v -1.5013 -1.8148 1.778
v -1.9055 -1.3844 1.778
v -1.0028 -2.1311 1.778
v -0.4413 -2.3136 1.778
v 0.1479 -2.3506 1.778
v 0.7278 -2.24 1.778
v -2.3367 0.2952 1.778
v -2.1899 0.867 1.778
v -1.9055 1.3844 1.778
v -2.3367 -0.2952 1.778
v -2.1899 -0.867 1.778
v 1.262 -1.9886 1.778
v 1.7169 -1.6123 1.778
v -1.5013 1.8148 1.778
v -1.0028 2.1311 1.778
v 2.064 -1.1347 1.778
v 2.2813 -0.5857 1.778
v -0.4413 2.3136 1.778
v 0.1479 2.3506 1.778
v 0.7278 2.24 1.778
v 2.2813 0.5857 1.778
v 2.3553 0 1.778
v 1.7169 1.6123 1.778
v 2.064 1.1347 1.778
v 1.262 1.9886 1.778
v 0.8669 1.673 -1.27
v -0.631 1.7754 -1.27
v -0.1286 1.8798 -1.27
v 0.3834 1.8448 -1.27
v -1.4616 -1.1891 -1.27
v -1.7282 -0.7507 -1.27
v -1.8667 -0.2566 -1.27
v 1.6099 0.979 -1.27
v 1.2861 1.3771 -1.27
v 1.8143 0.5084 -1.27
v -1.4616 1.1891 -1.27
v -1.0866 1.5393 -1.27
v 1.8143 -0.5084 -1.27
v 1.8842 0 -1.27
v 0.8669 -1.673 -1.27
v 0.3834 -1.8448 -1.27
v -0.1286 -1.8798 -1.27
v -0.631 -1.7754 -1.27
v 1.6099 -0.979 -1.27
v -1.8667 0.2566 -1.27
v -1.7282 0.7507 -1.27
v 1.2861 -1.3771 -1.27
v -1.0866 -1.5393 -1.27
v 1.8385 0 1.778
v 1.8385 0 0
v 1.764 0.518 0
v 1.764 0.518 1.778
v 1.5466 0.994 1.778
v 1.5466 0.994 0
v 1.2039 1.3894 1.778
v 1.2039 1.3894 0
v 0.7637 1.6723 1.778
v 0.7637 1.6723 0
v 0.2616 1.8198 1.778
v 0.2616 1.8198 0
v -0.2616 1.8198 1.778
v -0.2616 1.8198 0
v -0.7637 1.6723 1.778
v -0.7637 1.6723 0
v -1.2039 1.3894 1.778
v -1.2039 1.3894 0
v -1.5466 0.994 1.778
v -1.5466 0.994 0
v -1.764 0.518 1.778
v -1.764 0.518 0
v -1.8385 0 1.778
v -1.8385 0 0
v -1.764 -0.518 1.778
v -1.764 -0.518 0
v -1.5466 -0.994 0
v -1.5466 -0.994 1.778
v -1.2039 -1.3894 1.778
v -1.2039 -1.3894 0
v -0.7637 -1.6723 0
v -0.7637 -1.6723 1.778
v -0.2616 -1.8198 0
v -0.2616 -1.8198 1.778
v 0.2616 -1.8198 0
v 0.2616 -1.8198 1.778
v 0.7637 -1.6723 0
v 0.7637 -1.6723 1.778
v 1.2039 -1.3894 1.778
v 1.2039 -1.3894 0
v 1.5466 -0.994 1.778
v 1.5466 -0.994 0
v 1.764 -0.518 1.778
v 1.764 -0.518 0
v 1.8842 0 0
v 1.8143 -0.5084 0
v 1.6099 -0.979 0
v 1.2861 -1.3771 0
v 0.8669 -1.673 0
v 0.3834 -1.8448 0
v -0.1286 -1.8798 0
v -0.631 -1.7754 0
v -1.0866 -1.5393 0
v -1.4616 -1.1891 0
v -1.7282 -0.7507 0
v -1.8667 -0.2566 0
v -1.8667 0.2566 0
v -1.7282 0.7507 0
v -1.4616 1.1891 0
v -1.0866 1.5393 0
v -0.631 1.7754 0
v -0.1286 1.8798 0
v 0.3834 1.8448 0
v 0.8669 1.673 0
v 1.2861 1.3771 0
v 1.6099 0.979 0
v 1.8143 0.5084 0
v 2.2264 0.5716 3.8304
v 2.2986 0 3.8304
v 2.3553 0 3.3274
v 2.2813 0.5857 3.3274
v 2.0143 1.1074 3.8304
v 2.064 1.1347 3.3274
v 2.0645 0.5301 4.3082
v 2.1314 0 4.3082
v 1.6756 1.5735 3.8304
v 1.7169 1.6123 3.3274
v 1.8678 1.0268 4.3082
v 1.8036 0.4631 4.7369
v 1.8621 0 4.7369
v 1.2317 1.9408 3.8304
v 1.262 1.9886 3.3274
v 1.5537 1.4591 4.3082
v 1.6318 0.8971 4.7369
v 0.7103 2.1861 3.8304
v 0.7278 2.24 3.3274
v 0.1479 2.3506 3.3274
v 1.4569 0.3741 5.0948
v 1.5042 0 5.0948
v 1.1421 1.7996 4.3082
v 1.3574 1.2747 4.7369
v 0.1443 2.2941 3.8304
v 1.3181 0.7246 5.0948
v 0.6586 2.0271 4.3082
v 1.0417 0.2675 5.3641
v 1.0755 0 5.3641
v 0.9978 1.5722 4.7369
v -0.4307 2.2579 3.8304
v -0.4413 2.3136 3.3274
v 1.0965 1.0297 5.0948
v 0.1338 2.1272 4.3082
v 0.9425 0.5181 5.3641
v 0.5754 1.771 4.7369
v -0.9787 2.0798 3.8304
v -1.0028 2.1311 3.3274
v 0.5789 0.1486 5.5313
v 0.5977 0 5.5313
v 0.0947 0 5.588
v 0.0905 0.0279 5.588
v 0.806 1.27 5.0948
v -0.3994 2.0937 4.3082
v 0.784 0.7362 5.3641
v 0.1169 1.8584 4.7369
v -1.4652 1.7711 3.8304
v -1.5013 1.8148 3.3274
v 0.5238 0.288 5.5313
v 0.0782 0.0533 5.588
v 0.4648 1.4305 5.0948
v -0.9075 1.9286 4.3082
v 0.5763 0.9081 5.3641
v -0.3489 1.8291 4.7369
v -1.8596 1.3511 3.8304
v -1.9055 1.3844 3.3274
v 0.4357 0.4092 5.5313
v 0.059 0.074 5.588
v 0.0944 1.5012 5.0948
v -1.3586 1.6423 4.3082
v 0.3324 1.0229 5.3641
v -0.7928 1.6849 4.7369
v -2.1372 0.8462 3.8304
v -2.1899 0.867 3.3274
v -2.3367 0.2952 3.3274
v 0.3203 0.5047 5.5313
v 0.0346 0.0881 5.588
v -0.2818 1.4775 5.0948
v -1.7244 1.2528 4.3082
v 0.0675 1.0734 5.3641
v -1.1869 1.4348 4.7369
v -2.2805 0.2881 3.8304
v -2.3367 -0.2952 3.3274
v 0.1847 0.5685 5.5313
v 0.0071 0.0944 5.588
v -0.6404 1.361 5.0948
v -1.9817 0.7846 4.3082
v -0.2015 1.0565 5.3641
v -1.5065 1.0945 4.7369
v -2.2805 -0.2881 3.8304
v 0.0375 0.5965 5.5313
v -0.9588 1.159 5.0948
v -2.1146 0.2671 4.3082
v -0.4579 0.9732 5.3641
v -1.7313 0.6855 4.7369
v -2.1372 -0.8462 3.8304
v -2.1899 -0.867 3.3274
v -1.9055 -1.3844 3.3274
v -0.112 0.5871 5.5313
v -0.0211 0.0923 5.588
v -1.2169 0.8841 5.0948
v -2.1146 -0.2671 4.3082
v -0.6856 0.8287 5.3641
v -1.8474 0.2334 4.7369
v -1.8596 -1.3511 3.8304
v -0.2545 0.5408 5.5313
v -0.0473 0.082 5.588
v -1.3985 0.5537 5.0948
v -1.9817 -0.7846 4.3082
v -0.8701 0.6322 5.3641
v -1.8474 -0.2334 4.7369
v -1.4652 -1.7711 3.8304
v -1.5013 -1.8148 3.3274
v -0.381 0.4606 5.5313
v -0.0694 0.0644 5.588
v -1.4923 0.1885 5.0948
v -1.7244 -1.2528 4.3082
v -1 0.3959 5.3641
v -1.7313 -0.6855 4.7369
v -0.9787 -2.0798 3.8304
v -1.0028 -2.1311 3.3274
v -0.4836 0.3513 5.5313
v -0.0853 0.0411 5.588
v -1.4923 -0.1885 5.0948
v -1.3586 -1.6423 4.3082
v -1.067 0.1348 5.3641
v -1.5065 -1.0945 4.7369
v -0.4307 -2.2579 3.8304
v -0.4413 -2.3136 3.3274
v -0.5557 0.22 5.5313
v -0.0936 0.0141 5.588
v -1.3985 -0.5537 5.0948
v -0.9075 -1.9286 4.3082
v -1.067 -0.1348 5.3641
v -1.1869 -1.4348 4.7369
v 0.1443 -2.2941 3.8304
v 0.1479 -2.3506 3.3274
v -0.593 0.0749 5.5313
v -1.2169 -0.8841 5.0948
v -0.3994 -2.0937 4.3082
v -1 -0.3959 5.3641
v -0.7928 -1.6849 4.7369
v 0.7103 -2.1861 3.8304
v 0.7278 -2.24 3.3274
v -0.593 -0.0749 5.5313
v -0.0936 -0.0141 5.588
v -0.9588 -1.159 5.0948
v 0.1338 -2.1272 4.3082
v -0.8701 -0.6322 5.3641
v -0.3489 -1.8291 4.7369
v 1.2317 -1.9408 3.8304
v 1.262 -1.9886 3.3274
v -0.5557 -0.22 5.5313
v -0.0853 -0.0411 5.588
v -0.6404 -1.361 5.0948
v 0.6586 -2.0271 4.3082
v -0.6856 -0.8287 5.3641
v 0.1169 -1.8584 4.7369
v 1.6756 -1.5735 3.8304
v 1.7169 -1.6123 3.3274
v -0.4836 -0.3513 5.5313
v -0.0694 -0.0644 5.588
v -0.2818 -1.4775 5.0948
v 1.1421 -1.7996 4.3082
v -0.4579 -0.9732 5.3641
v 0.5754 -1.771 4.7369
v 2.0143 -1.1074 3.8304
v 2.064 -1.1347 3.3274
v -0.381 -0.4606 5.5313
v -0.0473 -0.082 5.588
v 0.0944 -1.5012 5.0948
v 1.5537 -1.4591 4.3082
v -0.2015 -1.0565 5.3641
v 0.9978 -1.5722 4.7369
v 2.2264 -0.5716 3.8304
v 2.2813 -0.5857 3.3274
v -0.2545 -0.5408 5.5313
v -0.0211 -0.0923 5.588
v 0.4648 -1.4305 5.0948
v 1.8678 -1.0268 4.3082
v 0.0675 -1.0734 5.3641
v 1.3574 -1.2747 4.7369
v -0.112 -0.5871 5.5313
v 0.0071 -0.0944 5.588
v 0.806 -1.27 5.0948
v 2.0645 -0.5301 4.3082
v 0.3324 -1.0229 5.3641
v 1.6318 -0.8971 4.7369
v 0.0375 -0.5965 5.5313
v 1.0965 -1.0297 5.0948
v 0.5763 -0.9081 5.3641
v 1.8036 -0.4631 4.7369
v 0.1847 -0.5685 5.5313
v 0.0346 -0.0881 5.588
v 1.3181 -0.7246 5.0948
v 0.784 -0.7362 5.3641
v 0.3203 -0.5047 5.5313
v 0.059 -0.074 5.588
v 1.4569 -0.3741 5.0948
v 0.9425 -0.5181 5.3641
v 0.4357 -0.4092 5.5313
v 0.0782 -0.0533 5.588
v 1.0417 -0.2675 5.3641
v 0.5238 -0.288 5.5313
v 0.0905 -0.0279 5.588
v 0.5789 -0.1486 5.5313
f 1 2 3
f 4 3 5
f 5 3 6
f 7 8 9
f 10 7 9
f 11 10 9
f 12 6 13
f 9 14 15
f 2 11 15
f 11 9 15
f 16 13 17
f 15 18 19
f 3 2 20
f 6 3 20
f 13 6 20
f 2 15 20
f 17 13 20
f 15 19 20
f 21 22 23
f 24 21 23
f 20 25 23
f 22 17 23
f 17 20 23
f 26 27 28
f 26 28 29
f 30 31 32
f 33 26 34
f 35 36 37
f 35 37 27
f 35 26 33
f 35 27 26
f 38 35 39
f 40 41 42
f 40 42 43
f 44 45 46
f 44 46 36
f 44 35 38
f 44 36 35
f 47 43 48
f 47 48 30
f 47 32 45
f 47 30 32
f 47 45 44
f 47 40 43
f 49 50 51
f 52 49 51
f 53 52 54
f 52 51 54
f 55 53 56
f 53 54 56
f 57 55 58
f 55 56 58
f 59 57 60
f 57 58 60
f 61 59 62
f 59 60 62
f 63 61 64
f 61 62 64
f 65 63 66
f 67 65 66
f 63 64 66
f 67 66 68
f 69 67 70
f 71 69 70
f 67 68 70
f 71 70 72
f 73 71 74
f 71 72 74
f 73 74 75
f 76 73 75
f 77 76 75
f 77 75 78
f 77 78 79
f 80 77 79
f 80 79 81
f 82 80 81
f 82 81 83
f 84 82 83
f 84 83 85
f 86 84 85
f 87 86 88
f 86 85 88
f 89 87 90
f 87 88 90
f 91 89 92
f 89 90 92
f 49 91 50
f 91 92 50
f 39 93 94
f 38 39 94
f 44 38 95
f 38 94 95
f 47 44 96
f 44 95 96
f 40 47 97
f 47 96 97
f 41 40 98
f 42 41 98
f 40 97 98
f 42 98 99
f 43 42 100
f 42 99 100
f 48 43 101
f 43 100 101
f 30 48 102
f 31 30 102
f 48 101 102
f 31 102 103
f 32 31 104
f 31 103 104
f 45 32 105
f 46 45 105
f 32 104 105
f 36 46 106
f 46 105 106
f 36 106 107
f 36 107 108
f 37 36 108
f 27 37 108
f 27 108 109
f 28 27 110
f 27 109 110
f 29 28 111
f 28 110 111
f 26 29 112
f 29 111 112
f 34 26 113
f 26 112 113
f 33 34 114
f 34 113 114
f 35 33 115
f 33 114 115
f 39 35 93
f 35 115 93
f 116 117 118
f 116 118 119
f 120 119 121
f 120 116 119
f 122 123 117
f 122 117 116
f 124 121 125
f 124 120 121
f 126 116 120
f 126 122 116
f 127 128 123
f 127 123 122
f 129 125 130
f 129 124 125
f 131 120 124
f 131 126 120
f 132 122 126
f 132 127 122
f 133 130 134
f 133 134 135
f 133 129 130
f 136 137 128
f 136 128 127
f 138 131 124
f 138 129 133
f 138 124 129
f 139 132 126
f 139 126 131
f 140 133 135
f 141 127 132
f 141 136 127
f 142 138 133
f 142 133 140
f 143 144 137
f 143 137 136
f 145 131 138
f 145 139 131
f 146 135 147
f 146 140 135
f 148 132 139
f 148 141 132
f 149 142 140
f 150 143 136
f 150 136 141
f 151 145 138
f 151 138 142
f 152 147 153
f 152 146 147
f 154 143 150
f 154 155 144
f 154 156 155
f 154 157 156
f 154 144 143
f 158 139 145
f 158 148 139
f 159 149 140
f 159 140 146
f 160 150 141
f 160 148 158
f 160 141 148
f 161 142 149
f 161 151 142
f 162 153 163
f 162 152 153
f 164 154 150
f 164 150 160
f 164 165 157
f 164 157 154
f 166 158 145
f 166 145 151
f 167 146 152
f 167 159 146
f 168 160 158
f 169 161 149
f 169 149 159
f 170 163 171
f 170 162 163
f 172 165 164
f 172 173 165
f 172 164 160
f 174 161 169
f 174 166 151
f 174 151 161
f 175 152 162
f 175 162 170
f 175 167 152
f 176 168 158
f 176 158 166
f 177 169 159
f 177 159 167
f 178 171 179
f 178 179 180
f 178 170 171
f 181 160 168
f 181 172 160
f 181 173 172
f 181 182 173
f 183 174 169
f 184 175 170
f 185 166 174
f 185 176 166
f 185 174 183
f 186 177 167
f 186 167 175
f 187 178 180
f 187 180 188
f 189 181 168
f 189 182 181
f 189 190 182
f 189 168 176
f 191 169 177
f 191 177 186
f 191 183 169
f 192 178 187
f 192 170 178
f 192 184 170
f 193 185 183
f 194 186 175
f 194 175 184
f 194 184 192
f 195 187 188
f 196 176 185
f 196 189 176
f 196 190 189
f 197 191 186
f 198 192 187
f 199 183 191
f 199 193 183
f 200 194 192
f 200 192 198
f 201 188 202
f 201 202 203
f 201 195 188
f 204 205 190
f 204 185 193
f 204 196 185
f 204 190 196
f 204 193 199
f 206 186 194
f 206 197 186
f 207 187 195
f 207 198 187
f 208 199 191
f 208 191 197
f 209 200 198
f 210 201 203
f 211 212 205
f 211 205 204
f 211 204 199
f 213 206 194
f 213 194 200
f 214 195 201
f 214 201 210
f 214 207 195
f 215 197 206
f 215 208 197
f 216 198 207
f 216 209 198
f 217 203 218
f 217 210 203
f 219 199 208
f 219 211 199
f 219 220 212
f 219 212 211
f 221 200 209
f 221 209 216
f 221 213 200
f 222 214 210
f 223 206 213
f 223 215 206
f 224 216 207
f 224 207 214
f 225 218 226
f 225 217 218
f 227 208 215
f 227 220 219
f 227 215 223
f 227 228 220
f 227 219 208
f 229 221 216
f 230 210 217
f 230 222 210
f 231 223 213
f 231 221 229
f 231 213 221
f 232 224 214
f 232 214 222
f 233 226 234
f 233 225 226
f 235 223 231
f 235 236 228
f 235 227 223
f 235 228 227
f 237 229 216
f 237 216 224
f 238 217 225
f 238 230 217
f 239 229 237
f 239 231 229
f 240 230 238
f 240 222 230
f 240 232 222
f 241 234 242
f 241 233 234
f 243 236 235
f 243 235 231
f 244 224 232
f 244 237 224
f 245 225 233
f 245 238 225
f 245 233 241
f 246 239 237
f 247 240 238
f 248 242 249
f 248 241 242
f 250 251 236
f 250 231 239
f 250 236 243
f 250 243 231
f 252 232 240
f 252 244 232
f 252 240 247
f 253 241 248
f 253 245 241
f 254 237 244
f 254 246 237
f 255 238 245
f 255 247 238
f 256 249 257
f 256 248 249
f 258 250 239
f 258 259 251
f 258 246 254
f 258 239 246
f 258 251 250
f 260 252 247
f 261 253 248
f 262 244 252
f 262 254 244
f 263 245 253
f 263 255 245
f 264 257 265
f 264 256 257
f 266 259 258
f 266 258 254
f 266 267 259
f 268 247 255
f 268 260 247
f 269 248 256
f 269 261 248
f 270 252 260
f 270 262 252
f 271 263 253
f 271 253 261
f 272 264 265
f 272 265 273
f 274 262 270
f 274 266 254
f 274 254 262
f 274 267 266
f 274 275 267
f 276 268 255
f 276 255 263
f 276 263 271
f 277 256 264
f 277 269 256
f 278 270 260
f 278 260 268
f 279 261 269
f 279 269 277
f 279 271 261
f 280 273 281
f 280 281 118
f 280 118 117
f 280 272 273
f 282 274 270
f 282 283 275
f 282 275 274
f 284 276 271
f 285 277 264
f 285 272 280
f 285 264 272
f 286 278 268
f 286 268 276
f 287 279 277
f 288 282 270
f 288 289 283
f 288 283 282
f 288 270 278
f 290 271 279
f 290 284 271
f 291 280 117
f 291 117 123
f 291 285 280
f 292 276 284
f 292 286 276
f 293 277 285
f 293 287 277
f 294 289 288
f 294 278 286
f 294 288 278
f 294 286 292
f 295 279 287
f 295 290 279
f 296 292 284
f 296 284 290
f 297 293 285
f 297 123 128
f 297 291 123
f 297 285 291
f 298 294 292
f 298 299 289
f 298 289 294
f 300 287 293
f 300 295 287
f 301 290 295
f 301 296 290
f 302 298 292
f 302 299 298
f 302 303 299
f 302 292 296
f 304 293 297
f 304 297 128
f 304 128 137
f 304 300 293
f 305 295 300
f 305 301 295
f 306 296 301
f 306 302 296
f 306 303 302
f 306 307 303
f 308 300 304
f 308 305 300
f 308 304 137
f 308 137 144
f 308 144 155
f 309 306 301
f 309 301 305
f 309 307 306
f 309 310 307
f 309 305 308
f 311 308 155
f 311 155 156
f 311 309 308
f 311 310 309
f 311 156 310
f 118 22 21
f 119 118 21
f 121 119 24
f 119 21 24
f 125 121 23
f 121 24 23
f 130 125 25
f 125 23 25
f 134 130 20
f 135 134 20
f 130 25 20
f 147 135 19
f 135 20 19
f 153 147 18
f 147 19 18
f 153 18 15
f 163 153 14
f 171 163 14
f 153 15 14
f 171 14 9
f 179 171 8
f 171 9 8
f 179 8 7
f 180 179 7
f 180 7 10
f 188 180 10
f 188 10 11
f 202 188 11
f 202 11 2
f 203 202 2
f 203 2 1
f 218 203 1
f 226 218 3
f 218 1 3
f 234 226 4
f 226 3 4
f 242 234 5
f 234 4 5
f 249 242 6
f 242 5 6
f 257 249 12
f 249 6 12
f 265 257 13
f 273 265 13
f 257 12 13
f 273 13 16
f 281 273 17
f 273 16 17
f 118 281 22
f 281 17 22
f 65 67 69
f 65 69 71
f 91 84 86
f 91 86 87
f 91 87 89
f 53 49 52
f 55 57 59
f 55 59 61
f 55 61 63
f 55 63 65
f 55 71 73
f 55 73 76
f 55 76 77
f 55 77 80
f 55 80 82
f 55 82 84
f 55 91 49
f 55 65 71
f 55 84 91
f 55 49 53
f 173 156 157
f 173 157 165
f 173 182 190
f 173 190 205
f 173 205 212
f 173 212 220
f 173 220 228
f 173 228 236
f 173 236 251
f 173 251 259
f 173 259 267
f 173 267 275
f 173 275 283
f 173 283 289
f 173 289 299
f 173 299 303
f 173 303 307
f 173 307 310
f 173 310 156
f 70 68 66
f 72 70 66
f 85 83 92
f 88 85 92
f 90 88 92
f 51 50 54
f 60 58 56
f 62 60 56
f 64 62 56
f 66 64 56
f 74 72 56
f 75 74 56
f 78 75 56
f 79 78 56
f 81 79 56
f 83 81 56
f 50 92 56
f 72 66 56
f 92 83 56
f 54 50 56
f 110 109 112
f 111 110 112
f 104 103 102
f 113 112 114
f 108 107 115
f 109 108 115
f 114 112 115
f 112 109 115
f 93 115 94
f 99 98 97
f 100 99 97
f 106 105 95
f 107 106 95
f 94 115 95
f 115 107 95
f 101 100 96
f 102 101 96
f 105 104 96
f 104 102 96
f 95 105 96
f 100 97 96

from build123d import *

# Parameters (mm, degrees)
F0_R     = 1.8384679537
F1_DEPTH = 1.778
F2_R     = 2.3552905633
F2_R_2   = 1.8384679537
F3_DEPTH = 3.81
F4_R     = 2.2606
F5_R     = 1.884215831
F5_R_2   = 1.8384679537
F6_DEPTH = 1.27


with BuildPart() as f1:
    # F0 (on Top) → F1 (new body)
    with BuildSketch(Plane.XY):
        Circle(F0_R)
    extrude(amount=F1_DEPTH)


with BuildPart() as f3:
    # F2 (on face) → F3 (new body)
    with BuildSketch(Plane.XY.offset(1.778)):
        Circle(F2_R)
        Circle(F2_R_2, mode=Mode.SUBTRACT)
        Circle(F2_R_2)
    extrude(amount=F3_DEPTH)

    # F4
    f4_edges = [f3.edges().sort_by_distance(p)[0] for p in [
        (-2.355291, 0, 5.588),
    ]]
    fillet(f4_edges, radius=F4_R)


with BuildPart() as f6:
    # F5 (on face) → F6 (new body)
    with BuildSketch(Plane(origin=(0, 0, 0), x_dir=(1, 0, 0), z_dir=(0, 0, -1))):
        Circle(F5_R)
        Circle(F5_R_2, mode=Mode.SUBTRACT)
        Circle(F5_R_2)
    extrude(amount=F6_DEPTH)


solid = Compound([f1.part, f3.part, f6.part])
